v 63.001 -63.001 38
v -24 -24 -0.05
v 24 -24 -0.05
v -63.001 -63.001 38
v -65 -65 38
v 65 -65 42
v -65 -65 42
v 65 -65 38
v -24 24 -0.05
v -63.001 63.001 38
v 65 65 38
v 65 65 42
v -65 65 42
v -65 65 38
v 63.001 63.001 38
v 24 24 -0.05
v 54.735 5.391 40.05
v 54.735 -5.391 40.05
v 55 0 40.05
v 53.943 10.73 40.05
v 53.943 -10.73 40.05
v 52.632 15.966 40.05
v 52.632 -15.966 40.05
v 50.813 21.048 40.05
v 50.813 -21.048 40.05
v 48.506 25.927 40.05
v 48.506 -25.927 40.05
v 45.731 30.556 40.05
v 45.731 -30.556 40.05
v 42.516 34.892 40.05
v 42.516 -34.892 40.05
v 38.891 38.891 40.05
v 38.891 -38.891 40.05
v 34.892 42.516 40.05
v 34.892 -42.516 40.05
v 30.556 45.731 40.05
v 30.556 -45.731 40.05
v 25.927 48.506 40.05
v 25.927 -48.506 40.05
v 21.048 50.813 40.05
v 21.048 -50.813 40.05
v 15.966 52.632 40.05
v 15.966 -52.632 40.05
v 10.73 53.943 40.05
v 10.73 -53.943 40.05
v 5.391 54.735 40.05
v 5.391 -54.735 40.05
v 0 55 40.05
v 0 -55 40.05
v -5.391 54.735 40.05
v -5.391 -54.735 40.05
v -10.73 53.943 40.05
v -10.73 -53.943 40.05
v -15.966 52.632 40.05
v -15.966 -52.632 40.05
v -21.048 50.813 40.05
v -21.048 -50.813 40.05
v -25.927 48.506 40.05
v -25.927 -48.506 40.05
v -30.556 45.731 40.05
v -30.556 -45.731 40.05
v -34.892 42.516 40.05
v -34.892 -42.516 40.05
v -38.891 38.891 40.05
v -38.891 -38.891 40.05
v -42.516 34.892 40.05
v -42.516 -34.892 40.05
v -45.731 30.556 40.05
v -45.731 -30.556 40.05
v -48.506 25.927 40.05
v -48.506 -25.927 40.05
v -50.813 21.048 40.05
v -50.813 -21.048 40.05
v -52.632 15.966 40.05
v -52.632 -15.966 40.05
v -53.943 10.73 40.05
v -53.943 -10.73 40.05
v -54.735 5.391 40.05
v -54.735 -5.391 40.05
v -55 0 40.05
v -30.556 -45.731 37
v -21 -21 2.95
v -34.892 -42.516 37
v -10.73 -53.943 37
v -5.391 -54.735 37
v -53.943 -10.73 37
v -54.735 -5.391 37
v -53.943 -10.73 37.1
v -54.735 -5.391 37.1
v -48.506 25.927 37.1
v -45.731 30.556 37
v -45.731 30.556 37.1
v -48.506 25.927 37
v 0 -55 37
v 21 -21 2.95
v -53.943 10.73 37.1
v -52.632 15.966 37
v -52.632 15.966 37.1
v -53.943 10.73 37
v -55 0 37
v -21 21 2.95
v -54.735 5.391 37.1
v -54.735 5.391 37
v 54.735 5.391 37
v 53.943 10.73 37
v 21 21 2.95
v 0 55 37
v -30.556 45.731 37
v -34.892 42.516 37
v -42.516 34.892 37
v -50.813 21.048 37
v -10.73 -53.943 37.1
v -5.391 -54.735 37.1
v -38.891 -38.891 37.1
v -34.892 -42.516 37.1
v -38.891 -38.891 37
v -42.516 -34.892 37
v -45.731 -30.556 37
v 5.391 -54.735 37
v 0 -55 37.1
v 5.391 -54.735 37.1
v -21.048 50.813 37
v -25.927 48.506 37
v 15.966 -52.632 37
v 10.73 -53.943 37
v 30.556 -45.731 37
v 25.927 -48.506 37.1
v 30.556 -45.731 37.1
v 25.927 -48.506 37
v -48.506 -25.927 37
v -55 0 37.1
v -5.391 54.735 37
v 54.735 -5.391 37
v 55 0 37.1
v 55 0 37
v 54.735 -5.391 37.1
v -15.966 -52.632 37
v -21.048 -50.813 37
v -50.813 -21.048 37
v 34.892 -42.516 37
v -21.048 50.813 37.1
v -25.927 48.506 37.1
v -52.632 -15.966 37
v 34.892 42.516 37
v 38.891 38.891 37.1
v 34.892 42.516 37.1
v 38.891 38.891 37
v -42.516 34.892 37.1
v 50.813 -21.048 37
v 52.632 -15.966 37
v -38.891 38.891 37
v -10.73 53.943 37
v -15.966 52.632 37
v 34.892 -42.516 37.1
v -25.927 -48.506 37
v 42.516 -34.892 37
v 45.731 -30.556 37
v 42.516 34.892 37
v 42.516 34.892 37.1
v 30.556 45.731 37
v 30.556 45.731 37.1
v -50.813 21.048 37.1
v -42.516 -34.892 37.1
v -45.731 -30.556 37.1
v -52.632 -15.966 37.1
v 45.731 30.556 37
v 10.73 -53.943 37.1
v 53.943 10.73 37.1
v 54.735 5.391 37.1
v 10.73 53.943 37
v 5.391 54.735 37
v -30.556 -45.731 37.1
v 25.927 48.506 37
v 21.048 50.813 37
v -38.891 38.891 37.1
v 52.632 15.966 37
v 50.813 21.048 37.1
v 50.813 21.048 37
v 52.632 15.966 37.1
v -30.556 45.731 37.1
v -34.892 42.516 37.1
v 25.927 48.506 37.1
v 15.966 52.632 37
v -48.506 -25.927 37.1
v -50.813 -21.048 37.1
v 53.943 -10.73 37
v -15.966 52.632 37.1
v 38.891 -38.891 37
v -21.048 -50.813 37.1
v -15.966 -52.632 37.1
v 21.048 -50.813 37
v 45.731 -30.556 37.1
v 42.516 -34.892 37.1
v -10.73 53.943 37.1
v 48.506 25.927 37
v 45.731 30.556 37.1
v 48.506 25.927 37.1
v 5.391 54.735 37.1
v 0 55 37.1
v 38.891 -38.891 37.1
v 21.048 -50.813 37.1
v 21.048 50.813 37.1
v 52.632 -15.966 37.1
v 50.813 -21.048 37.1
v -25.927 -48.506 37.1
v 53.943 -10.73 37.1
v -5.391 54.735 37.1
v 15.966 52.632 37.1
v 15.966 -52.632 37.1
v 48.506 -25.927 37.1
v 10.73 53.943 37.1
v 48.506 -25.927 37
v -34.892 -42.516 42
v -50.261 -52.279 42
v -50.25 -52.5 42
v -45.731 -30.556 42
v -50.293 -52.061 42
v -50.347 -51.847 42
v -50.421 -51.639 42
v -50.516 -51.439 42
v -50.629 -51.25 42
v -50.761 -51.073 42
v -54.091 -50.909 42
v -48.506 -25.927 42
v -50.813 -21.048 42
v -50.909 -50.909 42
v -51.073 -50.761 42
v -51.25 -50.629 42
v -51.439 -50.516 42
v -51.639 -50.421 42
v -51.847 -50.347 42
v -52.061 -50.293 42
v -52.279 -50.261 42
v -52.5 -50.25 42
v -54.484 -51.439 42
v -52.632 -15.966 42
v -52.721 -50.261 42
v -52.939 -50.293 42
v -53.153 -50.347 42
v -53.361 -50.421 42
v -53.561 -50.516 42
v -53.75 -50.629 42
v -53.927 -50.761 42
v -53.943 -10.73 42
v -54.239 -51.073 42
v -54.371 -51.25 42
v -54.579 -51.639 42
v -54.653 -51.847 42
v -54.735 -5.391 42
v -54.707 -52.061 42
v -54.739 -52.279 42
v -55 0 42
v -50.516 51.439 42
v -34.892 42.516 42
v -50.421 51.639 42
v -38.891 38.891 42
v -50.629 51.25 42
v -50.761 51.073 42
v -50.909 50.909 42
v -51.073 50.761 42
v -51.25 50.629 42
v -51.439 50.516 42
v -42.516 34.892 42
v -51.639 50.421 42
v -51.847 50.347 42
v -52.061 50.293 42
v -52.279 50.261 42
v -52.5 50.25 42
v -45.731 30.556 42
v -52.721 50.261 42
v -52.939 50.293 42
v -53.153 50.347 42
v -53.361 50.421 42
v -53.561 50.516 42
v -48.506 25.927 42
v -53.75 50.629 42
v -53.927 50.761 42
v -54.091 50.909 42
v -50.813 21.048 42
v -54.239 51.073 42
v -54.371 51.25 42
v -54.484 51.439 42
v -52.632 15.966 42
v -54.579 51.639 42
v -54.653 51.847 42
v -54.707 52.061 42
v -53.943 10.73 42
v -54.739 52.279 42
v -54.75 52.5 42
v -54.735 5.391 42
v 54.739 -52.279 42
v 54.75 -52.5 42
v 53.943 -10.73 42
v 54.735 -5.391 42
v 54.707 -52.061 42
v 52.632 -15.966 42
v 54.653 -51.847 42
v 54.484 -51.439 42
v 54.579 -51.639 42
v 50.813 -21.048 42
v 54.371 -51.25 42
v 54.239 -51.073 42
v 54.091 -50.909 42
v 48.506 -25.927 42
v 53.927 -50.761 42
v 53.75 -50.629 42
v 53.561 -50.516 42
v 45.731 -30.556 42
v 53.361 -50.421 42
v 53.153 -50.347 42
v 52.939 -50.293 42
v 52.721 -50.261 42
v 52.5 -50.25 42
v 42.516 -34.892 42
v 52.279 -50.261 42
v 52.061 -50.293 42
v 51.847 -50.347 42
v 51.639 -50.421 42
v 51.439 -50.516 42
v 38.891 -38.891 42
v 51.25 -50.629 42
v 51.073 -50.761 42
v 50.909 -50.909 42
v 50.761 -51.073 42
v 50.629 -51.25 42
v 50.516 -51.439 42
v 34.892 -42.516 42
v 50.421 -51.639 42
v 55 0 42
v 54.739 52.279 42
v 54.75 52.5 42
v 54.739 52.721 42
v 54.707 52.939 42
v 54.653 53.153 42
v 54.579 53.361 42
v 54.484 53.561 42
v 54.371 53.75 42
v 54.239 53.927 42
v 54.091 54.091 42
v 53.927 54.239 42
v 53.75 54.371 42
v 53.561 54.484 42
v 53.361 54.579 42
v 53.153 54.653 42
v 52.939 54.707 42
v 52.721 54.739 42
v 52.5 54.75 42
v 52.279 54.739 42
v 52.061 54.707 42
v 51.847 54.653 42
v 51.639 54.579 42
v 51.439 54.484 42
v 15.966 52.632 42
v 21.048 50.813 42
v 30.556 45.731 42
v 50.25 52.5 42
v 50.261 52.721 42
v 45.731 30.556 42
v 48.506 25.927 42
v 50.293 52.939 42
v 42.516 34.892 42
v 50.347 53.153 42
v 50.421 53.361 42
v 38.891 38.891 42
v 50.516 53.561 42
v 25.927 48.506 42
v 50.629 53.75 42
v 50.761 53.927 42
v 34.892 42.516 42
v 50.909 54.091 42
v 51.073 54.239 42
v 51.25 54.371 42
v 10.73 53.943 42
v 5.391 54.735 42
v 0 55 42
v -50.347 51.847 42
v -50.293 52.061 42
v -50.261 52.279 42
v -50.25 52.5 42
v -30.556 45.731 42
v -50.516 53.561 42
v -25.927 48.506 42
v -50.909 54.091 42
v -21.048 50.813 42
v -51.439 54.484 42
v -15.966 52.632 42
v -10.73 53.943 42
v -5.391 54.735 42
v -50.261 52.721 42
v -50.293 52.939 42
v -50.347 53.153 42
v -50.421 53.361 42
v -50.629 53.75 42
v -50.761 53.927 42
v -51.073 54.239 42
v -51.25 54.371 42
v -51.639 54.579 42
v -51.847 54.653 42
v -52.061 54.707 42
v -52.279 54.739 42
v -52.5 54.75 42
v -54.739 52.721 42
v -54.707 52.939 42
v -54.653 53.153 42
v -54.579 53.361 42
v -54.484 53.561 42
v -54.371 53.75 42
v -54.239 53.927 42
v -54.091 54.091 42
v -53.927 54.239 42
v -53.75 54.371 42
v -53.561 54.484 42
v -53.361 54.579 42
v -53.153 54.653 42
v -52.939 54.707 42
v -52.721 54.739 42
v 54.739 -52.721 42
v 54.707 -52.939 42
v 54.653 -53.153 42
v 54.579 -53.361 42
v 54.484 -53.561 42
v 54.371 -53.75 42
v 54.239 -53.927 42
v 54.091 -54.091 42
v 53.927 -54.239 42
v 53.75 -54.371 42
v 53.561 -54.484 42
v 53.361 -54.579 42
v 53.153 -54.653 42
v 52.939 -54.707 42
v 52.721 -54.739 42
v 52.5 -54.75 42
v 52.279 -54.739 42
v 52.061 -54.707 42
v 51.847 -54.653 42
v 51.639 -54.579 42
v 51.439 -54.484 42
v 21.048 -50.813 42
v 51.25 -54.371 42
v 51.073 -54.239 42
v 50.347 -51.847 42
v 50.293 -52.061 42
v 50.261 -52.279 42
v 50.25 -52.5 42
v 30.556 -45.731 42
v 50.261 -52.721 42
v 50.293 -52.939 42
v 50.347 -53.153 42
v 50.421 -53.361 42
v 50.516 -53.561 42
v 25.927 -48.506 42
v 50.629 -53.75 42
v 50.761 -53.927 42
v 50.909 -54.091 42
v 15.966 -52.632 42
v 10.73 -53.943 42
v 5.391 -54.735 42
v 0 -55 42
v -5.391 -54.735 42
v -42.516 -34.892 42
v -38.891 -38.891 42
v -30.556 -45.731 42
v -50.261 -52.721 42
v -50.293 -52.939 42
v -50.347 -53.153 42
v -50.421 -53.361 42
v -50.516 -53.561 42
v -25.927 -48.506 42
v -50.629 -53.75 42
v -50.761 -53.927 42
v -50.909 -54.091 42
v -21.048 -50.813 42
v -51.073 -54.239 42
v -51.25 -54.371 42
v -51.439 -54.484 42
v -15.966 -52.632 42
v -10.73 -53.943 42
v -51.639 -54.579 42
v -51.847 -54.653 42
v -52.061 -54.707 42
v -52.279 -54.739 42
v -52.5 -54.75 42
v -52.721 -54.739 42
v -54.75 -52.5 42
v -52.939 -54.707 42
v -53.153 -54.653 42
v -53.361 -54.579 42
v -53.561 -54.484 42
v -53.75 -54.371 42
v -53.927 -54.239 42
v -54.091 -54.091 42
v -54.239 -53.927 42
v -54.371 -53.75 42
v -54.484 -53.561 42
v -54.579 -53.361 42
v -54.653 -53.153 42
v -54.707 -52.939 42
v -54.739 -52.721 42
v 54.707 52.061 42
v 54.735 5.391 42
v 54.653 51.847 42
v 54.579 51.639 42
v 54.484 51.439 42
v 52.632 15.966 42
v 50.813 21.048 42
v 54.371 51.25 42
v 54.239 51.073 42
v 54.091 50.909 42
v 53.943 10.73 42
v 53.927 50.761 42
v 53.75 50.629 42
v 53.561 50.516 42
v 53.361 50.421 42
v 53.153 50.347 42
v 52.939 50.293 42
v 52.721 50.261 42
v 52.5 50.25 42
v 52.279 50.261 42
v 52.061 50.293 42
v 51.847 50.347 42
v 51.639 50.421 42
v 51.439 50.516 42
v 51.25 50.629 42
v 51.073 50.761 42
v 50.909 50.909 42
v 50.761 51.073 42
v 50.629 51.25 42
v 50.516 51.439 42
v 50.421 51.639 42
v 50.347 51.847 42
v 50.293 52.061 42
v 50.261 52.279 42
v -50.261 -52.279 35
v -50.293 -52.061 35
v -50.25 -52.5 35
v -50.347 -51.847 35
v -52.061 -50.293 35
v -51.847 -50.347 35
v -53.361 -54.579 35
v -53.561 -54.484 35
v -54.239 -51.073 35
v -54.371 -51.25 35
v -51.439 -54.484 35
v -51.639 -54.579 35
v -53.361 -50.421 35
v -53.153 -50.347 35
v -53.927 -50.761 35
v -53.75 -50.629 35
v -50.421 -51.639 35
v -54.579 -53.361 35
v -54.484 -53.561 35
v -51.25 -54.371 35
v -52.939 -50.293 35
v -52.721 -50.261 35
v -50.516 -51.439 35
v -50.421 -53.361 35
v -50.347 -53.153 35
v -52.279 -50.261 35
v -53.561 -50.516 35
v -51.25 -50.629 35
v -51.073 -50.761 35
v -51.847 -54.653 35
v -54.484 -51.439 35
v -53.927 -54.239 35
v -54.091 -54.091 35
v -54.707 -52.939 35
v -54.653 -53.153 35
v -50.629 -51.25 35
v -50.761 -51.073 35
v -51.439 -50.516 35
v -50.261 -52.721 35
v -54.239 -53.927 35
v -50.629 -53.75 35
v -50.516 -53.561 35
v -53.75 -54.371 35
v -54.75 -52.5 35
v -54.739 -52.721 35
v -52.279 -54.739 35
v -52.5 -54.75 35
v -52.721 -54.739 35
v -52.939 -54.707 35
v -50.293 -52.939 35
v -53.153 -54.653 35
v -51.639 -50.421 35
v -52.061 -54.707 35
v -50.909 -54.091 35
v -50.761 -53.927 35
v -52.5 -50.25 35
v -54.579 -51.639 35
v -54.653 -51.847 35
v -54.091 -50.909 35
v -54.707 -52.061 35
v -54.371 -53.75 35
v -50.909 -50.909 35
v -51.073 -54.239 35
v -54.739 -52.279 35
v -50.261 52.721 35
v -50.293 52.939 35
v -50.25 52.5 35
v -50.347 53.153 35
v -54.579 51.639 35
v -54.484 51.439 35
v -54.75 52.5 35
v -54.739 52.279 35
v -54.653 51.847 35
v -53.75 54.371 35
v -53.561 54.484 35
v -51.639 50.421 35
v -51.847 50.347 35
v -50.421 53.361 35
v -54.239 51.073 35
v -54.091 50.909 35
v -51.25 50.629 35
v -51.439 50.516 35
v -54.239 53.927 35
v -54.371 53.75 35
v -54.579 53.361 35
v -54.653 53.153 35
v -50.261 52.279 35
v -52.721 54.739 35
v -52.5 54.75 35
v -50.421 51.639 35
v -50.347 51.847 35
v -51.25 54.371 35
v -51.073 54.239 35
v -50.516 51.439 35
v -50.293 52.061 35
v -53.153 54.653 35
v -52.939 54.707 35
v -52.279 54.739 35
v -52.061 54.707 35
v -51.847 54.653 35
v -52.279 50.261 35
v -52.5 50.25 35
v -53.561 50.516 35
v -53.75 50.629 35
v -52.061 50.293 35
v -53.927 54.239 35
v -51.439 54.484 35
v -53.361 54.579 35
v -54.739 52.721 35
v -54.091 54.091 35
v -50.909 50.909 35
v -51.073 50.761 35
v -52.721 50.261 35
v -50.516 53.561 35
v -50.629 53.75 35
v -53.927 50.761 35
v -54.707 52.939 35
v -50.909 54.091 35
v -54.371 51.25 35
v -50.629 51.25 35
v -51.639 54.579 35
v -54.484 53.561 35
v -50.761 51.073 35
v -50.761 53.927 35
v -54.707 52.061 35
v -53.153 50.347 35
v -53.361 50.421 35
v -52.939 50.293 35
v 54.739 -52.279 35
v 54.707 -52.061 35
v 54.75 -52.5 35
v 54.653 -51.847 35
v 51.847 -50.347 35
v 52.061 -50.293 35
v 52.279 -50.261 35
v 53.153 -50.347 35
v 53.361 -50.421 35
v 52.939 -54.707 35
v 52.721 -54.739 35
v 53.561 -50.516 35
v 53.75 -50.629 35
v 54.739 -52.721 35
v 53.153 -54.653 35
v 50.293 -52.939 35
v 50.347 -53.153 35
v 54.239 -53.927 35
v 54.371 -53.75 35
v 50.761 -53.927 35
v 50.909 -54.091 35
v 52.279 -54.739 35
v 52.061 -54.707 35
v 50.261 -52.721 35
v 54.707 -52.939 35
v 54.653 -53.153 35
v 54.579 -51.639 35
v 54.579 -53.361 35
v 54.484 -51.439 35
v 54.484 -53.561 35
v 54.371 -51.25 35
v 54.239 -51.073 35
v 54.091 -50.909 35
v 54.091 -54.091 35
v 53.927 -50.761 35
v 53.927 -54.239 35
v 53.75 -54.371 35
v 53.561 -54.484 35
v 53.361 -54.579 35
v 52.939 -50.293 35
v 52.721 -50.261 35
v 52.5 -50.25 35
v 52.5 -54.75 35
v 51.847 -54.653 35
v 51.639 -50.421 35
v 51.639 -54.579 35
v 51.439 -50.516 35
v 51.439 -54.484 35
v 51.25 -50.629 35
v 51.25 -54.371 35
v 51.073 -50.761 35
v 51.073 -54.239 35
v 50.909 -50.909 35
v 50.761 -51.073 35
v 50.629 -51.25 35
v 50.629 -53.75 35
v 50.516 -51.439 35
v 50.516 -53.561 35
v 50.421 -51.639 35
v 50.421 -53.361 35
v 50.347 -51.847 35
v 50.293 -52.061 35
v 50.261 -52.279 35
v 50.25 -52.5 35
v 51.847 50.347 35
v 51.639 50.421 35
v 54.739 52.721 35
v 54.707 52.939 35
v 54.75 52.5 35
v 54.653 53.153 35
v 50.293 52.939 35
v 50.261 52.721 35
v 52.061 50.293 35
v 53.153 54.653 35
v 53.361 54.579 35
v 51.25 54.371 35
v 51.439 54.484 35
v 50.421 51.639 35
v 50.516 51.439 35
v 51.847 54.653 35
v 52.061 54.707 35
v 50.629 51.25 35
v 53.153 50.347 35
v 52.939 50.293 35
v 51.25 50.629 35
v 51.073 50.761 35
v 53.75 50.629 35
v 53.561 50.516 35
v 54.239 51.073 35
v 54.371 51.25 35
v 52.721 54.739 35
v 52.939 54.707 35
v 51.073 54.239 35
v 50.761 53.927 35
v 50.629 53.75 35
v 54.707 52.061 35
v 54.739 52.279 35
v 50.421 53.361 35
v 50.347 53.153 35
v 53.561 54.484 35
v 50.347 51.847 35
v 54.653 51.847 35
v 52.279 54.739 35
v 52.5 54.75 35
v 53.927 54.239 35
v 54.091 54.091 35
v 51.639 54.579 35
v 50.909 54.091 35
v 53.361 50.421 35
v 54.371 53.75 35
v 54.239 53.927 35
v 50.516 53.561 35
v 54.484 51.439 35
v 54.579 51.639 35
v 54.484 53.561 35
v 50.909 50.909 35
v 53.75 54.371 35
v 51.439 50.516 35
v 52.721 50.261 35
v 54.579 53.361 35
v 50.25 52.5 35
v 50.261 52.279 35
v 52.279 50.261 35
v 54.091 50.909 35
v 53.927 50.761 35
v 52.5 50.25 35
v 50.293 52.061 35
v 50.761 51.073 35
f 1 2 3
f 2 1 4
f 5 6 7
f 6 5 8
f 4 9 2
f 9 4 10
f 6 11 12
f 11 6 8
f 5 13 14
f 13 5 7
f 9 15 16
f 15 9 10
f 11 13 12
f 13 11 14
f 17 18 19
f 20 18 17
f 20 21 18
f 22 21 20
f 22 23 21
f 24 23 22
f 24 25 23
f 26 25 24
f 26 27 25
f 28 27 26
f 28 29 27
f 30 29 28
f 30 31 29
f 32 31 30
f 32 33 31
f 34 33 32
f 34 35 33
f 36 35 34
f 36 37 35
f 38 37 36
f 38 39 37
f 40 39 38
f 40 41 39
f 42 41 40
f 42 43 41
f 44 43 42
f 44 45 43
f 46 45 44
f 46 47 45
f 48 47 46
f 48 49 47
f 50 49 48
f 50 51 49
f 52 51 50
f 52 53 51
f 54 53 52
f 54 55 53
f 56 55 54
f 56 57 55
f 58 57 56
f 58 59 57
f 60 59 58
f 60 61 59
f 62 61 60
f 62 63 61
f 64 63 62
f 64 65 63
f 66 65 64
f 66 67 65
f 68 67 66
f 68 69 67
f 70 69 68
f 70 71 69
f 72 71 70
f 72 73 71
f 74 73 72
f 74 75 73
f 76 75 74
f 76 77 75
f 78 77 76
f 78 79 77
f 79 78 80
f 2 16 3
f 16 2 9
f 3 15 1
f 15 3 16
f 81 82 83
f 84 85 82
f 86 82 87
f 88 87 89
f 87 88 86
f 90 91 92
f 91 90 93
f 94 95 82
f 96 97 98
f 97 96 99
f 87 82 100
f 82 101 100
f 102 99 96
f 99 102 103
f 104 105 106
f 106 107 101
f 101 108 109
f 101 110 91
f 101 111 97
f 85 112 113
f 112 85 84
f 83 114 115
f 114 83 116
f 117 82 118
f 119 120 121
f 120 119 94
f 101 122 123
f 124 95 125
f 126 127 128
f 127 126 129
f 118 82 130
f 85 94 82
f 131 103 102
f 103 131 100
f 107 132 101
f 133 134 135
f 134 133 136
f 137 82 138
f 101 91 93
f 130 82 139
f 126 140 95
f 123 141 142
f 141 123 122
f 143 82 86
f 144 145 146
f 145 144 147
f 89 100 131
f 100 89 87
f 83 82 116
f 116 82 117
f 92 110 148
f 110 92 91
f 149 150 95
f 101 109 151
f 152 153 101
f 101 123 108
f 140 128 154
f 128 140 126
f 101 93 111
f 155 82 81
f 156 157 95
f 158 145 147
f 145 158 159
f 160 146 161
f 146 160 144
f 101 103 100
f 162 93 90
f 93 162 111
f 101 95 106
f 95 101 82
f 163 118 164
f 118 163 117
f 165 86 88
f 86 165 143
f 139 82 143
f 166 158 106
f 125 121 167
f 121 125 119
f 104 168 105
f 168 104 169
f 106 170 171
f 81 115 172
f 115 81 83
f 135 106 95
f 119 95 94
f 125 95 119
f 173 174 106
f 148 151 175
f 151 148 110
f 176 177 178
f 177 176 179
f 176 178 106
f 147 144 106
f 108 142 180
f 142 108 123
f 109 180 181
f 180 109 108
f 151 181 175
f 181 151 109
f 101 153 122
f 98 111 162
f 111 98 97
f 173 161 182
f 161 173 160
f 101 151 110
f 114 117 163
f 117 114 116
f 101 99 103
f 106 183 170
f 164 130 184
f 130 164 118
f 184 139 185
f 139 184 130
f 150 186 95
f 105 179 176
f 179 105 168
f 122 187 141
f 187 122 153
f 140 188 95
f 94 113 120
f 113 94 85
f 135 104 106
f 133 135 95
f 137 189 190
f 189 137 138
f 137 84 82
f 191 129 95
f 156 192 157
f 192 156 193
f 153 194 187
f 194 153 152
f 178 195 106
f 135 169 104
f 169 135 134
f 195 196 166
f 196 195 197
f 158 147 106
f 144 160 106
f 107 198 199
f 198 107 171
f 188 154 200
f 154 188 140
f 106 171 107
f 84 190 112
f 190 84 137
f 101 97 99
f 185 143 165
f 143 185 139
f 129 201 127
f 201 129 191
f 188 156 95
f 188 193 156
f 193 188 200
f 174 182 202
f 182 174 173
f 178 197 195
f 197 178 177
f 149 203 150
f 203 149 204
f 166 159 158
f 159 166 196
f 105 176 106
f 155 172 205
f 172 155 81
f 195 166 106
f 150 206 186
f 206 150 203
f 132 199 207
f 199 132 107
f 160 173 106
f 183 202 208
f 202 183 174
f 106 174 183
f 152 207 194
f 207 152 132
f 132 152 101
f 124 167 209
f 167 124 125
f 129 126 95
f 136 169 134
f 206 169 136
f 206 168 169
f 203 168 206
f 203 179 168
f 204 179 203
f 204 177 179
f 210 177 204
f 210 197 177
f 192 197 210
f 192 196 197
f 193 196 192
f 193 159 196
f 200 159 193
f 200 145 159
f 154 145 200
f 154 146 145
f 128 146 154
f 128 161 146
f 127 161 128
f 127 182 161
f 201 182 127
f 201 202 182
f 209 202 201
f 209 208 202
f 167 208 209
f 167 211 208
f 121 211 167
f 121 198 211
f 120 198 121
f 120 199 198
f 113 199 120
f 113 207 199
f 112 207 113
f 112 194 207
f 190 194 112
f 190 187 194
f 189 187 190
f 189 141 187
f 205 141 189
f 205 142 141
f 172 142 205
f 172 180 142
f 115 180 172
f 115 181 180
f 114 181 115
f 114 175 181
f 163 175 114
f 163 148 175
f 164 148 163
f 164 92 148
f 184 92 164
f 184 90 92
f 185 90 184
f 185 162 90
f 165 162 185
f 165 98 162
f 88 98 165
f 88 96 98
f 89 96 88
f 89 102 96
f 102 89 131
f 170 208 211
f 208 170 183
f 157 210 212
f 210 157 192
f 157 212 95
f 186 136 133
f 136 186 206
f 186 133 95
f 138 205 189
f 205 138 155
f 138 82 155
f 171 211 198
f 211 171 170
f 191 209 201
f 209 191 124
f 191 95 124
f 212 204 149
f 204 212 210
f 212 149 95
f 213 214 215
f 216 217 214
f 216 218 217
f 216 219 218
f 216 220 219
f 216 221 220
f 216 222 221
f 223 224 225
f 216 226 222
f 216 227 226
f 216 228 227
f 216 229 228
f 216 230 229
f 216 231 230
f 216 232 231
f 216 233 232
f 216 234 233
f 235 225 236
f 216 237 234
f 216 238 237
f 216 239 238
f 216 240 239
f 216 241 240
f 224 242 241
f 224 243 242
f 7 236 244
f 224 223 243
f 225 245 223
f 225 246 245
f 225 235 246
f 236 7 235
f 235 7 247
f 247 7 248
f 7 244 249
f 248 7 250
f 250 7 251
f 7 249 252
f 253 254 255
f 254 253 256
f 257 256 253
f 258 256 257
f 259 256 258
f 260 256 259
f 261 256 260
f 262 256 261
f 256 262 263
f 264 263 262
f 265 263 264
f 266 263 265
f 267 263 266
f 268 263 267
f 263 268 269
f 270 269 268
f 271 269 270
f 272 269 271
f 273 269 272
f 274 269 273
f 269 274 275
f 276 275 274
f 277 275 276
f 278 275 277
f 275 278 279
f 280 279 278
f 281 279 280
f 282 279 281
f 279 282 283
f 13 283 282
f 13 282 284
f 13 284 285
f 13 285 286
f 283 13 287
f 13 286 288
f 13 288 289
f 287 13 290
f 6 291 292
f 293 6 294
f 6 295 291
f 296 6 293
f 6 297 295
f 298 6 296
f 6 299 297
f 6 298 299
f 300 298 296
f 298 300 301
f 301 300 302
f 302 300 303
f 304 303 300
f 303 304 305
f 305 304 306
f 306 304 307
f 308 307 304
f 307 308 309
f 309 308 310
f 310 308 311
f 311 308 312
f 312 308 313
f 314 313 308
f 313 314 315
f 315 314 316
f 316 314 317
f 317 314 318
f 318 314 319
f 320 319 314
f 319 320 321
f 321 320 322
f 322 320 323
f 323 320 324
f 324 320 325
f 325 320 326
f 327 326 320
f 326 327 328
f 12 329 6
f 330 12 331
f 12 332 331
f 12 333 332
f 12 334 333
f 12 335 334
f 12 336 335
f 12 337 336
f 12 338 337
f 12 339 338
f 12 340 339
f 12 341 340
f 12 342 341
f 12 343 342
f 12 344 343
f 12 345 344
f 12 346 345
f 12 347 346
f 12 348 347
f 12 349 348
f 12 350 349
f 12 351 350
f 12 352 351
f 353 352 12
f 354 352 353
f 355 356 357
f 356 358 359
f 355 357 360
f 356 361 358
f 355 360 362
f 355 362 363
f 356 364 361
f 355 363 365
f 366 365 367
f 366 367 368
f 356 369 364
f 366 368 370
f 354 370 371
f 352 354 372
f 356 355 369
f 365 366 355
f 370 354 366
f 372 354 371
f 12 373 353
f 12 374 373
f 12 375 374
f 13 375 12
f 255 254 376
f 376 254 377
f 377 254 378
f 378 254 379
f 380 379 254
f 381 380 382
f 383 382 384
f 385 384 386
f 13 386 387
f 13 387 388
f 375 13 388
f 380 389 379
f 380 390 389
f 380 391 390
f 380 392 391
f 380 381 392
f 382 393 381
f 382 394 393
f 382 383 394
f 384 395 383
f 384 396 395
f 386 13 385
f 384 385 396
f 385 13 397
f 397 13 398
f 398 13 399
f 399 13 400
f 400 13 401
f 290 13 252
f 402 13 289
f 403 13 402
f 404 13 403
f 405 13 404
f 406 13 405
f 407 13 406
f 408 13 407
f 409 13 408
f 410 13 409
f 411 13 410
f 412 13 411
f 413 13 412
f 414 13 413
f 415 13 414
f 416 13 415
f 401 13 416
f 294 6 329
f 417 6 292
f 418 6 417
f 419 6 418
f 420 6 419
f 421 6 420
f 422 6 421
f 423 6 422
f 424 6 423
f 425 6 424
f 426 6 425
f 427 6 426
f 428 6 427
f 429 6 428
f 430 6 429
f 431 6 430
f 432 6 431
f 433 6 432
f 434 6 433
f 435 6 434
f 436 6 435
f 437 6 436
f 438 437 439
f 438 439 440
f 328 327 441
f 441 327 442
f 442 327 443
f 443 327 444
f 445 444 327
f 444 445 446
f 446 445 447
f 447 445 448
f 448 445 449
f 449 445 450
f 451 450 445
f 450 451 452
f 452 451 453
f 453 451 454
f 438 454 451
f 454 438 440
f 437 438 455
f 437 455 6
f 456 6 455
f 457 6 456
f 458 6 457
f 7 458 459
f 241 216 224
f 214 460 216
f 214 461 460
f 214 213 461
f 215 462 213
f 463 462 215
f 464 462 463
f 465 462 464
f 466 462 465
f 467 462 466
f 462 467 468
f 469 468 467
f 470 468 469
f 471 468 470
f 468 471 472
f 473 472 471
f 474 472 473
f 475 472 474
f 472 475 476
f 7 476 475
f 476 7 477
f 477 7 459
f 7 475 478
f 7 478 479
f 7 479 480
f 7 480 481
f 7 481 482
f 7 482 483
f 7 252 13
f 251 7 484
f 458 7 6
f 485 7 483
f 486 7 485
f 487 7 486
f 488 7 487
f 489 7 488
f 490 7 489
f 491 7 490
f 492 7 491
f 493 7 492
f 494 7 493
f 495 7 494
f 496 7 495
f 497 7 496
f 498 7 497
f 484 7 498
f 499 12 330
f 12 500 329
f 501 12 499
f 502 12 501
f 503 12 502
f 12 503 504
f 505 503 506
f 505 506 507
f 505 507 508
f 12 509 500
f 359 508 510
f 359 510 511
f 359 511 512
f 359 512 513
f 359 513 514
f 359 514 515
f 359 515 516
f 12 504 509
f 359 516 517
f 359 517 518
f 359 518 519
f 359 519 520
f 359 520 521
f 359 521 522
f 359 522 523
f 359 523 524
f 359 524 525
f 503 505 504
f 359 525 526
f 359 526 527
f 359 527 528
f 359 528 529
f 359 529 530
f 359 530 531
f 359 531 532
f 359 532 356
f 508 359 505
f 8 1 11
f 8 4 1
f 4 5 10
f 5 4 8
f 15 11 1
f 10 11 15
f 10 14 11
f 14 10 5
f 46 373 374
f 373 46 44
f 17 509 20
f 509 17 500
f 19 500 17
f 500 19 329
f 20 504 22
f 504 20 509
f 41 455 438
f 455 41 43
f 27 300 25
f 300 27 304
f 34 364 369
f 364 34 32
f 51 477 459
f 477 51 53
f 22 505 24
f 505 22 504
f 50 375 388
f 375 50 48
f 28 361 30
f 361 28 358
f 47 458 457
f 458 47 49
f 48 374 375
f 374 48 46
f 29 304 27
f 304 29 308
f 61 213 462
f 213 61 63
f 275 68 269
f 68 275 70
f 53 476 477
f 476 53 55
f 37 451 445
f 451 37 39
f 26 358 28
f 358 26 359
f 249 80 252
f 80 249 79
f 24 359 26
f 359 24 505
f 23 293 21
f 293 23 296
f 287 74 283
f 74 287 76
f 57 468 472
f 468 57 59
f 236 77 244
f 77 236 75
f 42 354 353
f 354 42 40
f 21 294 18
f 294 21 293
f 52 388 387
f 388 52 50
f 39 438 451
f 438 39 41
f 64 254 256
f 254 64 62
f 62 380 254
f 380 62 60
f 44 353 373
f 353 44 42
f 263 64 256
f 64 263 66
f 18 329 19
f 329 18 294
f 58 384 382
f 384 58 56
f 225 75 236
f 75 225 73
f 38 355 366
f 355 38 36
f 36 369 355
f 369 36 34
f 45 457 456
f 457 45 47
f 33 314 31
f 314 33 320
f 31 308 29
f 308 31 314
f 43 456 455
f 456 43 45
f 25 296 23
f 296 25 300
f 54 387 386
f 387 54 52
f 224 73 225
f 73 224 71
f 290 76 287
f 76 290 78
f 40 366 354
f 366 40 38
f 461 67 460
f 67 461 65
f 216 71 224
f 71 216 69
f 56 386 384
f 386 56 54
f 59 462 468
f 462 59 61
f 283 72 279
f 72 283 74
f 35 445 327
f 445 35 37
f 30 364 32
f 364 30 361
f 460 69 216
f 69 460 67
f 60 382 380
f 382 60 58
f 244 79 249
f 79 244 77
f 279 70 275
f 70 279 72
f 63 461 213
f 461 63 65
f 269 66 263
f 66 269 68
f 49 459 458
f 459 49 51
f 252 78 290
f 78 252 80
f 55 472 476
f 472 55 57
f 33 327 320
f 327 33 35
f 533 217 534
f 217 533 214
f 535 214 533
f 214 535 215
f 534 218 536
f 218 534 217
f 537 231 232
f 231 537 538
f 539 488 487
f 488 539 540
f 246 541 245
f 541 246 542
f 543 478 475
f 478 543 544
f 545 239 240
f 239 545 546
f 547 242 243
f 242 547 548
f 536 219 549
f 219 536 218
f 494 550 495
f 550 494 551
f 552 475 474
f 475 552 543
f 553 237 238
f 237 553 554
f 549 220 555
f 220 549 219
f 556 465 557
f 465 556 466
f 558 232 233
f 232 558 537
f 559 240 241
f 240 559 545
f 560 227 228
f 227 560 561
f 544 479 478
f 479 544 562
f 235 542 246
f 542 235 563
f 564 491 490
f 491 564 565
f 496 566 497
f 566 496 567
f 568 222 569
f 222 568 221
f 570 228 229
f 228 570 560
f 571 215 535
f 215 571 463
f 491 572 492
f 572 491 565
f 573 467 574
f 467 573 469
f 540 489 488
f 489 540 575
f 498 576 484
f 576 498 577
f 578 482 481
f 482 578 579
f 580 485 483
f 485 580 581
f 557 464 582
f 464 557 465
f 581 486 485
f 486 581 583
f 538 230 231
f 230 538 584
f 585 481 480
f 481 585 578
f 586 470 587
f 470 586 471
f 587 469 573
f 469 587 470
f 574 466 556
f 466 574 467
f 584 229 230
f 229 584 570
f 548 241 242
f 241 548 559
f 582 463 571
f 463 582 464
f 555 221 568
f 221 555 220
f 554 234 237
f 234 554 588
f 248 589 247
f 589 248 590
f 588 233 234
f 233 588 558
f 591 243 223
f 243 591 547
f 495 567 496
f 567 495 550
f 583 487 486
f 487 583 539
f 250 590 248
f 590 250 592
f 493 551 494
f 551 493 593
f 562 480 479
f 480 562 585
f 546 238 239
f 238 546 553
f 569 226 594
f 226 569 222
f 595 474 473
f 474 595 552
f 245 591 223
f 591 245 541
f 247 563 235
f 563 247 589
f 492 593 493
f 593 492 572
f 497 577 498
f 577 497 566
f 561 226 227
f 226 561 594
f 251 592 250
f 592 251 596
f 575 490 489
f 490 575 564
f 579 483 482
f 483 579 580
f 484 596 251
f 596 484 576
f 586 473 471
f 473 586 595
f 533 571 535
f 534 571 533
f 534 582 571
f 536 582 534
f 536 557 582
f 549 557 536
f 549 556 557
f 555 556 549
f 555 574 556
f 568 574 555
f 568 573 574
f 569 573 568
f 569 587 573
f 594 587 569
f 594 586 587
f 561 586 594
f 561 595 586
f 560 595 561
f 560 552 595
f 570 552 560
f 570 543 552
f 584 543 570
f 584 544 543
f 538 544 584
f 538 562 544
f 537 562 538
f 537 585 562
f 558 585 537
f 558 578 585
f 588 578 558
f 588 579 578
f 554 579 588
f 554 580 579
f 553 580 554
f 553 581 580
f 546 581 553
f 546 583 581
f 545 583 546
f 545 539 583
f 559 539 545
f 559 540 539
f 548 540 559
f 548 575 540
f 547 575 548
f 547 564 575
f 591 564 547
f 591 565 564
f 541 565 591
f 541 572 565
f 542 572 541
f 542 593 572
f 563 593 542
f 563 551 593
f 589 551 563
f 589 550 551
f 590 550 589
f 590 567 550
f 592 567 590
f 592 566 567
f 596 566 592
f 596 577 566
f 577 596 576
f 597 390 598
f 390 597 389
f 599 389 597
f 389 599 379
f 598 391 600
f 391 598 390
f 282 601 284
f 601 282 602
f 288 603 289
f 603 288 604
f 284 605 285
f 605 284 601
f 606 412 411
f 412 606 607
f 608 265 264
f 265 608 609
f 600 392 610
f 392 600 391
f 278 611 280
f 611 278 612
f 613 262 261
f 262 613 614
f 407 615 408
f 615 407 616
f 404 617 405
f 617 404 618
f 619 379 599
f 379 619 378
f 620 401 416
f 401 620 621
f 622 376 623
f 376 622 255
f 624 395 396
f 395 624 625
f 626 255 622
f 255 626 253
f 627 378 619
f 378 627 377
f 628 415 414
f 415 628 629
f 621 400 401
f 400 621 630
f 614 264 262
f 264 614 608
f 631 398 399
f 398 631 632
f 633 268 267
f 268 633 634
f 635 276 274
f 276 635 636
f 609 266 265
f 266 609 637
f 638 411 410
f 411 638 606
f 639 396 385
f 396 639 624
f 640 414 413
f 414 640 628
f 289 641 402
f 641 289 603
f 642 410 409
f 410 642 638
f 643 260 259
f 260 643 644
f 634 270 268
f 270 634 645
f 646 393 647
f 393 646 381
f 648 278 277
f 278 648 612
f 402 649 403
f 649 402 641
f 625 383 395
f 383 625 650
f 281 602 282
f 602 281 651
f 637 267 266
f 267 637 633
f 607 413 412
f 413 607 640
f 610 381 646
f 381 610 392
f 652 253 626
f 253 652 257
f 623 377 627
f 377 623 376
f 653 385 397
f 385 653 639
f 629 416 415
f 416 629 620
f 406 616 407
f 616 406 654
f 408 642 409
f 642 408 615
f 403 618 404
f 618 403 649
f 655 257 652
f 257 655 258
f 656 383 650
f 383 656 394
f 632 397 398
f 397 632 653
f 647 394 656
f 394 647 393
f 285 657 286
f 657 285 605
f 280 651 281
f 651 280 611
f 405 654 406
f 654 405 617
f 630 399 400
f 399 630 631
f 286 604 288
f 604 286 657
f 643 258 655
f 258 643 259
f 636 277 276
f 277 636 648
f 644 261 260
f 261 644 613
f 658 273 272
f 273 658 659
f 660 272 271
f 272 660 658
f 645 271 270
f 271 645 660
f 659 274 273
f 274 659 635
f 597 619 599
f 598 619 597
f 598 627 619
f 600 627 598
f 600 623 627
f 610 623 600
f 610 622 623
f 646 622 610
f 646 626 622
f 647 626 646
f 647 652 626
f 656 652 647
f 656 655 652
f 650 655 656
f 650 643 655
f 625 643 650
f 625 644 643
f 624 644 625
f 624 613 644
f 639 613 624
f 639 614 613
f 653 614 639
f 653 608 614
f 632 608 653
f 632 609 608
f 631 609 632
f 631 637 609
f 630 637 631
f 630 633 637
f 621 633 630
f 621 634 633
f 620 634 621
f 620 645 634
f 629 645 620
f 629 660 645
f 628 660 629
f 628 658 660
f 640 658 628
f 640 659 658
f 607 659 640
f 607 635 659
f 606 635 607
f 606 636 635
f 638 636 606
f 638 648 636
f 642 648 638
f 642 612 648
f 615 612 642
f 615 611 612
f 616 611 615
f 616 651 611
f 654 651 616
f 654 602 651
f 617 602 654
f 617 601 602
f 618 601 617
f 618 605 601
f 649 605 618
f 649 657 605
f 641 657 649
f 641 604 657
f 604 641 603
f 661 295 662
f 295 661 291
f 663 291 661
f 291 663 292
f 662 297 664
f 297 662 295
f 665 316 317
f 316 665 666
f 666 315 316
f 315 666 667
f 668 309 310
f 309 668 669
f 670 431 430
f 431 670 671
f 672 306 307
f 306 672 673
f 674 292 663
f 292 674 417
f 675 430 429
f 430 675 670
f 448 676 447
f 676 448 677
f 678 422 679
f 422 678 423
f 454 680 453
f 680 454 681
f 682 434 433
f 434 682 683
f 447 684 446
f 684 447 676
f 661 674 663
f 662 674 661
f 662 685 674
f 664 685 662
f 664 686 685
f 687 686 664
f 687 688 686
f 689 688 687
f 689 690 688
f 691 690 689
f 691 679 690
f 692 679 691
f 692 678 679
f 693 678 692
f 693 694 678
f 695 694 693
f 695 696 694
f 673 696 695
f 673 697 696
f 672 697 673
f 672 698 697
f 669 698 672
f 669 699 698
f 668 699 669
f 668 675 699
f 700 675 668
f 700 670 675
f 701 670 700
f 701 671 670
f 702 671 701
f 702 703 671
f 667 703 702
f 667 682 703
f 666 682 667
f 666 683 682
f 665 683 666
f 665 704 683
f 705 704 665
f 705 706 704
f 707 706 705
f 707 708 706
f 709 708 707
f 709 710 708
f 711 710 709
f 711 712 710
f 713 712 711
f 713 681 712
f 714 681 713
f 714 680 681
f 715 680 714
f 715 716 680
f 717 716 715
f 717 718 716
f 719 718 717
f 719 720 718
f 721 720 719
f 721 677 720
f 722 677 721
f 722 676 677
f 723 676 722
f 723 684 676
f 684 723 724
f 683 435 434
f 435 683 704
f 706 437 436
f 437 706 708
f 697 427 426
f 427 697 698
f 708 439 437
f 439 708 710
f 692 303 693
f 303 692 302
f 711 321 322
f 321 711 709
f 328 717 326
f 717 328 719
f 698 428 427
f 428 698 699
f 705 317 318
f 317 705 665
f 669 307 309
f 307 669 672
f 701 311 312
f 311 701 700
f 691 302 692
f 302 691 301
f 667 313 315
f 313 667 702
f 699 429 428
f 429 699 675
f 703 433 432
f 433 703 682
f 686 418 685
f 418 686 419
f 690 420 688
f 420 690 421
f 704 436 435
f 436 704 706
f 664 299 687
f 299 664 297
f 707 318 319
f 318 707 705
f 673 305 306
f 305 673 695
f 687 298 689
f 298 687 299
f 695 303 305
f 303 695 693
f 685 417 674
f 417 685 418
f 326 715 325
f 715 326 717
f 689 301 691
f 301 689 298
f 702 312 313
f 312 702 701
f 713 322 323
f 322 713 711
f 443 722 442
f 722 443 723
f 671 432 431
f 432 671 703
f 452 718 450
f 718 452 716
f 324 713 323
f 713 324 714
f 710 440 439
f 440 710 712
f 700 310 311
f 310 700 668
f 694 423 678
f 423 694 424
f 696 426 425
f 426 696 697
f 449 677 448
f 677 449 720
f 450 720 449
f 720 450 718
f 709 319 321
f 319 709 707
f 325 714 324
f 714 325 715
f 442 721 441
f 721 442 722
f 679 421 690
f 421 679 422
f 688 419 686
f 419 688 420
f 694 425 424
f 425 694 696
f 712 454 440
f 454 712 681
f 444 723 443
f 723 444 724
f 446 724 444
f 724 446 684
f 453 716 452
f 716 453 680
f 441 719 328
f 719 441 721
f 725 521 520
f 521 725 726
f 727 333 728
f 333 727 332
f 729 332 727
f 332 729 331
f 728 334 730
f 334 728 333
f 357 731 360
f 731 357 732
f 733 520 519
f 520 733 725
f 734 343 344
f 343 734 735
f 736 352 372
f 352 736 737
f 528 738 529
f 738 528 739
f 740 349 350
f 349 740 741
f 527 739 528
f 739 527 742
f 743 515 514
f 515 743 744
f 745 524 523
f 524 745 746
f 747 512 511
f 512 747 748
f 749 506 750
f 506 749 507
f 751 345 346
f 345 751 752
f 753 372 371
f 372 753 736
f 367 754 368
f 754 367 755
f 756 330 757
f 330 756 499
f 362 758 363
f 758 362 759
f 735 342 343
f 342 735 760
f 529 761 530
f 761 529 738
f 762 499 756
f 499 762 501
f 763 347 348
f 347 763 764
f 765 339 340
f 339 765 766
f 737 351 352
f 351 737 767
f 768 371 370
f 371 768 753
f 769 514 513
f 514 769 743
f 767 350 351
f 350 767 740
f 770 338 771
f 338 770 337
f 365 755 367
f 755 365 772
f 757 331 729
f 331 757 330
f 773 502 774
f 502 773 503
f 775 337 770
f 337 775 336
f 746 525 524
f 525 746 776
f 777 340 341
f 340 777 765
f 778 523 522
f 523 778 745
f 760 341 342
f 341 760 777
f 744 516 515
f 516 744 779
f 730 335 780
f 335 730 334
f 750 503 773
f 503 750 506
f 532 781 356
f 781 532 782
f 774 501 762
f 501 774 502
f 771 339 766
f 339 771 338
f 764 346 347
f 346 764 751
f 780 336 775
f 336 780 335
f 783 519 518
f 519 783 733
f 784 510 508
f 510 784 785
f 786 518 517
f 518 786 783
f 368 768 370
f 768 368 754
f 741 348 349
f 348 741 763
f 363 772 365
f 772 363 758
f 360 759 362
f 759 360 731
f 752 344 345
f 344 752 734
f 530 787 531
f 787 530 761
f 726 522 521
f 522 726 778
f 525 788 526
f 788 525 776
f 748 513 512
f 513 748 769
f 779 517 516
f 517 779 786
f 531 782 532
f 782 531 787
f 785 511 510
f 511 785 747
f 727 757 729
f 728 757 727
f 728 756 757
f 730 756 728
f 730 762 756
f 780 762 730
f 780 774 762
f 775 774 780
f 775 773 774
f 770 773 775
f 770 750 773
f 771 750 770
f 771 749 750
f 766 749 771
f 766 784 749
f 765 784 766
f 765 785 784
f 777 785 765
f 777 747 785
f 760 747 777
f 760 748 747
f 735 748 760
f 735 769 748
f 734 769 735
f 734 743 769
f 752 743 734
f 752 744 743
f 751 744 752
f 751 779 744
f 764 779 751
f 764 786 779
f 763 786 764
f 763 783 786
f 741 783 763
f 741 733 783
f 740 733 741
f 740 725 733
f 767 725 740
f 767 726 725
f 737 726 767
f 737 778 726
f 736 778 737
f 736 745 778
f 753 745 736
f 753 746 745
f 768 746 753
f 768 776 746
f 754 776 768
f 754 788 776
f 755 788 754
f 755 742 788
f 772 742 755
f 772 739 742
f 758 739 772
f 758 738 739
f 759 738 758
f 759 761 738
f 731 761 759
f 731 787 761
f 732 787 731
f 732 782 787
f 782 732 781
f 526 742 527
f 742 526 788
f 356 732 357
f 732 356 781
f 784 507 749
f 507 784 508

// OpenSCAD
$fn = 64;
difference() {
	union() {
		difference() {
			hull() {
				cube(center = true, size = [48, 48, 0.1]);
				translate(v = [0, 0, 40]) {
					cube(center = true, size = [130, 130, 0.1]);
				}
			}
			hull() {
				translate(v = [0, 0, 3]) {
					cube(center = true, size = [42, 42, 0.1]);
				}
				translate(v = [0, 0, 37]) {
					cylinder(h = 0.1, r = 55.0);
				}
			}
		}
		difference() {
			translate(v = [0, 0, 40]) {
				cube(center = true, size = [130, 130, 4]);
			}
			translate(v = [0, 0, 40]) {
				cylinder(center = true, h = 5, r = 55.0);
			}
		}
	}
	union() {
		translate(v = [-52.5, -52.5, 40]) {
			cylinder(center = true, h = 10, r = 2.25);
		}
		translate(v = [-52.5, 52.5, 40]) {
			cylinder(center = true, h = 10, r = 2.25);
		}
		translate(v = [52.5, -52.5, 40]) {
			cylinder(center = true, h = 10, r = 2.25);
		}
		translate(v = [52.5, 52.5, 40]) {
			cylinder(center = true, h = 10, r = 2.25);
		}
	}
}
